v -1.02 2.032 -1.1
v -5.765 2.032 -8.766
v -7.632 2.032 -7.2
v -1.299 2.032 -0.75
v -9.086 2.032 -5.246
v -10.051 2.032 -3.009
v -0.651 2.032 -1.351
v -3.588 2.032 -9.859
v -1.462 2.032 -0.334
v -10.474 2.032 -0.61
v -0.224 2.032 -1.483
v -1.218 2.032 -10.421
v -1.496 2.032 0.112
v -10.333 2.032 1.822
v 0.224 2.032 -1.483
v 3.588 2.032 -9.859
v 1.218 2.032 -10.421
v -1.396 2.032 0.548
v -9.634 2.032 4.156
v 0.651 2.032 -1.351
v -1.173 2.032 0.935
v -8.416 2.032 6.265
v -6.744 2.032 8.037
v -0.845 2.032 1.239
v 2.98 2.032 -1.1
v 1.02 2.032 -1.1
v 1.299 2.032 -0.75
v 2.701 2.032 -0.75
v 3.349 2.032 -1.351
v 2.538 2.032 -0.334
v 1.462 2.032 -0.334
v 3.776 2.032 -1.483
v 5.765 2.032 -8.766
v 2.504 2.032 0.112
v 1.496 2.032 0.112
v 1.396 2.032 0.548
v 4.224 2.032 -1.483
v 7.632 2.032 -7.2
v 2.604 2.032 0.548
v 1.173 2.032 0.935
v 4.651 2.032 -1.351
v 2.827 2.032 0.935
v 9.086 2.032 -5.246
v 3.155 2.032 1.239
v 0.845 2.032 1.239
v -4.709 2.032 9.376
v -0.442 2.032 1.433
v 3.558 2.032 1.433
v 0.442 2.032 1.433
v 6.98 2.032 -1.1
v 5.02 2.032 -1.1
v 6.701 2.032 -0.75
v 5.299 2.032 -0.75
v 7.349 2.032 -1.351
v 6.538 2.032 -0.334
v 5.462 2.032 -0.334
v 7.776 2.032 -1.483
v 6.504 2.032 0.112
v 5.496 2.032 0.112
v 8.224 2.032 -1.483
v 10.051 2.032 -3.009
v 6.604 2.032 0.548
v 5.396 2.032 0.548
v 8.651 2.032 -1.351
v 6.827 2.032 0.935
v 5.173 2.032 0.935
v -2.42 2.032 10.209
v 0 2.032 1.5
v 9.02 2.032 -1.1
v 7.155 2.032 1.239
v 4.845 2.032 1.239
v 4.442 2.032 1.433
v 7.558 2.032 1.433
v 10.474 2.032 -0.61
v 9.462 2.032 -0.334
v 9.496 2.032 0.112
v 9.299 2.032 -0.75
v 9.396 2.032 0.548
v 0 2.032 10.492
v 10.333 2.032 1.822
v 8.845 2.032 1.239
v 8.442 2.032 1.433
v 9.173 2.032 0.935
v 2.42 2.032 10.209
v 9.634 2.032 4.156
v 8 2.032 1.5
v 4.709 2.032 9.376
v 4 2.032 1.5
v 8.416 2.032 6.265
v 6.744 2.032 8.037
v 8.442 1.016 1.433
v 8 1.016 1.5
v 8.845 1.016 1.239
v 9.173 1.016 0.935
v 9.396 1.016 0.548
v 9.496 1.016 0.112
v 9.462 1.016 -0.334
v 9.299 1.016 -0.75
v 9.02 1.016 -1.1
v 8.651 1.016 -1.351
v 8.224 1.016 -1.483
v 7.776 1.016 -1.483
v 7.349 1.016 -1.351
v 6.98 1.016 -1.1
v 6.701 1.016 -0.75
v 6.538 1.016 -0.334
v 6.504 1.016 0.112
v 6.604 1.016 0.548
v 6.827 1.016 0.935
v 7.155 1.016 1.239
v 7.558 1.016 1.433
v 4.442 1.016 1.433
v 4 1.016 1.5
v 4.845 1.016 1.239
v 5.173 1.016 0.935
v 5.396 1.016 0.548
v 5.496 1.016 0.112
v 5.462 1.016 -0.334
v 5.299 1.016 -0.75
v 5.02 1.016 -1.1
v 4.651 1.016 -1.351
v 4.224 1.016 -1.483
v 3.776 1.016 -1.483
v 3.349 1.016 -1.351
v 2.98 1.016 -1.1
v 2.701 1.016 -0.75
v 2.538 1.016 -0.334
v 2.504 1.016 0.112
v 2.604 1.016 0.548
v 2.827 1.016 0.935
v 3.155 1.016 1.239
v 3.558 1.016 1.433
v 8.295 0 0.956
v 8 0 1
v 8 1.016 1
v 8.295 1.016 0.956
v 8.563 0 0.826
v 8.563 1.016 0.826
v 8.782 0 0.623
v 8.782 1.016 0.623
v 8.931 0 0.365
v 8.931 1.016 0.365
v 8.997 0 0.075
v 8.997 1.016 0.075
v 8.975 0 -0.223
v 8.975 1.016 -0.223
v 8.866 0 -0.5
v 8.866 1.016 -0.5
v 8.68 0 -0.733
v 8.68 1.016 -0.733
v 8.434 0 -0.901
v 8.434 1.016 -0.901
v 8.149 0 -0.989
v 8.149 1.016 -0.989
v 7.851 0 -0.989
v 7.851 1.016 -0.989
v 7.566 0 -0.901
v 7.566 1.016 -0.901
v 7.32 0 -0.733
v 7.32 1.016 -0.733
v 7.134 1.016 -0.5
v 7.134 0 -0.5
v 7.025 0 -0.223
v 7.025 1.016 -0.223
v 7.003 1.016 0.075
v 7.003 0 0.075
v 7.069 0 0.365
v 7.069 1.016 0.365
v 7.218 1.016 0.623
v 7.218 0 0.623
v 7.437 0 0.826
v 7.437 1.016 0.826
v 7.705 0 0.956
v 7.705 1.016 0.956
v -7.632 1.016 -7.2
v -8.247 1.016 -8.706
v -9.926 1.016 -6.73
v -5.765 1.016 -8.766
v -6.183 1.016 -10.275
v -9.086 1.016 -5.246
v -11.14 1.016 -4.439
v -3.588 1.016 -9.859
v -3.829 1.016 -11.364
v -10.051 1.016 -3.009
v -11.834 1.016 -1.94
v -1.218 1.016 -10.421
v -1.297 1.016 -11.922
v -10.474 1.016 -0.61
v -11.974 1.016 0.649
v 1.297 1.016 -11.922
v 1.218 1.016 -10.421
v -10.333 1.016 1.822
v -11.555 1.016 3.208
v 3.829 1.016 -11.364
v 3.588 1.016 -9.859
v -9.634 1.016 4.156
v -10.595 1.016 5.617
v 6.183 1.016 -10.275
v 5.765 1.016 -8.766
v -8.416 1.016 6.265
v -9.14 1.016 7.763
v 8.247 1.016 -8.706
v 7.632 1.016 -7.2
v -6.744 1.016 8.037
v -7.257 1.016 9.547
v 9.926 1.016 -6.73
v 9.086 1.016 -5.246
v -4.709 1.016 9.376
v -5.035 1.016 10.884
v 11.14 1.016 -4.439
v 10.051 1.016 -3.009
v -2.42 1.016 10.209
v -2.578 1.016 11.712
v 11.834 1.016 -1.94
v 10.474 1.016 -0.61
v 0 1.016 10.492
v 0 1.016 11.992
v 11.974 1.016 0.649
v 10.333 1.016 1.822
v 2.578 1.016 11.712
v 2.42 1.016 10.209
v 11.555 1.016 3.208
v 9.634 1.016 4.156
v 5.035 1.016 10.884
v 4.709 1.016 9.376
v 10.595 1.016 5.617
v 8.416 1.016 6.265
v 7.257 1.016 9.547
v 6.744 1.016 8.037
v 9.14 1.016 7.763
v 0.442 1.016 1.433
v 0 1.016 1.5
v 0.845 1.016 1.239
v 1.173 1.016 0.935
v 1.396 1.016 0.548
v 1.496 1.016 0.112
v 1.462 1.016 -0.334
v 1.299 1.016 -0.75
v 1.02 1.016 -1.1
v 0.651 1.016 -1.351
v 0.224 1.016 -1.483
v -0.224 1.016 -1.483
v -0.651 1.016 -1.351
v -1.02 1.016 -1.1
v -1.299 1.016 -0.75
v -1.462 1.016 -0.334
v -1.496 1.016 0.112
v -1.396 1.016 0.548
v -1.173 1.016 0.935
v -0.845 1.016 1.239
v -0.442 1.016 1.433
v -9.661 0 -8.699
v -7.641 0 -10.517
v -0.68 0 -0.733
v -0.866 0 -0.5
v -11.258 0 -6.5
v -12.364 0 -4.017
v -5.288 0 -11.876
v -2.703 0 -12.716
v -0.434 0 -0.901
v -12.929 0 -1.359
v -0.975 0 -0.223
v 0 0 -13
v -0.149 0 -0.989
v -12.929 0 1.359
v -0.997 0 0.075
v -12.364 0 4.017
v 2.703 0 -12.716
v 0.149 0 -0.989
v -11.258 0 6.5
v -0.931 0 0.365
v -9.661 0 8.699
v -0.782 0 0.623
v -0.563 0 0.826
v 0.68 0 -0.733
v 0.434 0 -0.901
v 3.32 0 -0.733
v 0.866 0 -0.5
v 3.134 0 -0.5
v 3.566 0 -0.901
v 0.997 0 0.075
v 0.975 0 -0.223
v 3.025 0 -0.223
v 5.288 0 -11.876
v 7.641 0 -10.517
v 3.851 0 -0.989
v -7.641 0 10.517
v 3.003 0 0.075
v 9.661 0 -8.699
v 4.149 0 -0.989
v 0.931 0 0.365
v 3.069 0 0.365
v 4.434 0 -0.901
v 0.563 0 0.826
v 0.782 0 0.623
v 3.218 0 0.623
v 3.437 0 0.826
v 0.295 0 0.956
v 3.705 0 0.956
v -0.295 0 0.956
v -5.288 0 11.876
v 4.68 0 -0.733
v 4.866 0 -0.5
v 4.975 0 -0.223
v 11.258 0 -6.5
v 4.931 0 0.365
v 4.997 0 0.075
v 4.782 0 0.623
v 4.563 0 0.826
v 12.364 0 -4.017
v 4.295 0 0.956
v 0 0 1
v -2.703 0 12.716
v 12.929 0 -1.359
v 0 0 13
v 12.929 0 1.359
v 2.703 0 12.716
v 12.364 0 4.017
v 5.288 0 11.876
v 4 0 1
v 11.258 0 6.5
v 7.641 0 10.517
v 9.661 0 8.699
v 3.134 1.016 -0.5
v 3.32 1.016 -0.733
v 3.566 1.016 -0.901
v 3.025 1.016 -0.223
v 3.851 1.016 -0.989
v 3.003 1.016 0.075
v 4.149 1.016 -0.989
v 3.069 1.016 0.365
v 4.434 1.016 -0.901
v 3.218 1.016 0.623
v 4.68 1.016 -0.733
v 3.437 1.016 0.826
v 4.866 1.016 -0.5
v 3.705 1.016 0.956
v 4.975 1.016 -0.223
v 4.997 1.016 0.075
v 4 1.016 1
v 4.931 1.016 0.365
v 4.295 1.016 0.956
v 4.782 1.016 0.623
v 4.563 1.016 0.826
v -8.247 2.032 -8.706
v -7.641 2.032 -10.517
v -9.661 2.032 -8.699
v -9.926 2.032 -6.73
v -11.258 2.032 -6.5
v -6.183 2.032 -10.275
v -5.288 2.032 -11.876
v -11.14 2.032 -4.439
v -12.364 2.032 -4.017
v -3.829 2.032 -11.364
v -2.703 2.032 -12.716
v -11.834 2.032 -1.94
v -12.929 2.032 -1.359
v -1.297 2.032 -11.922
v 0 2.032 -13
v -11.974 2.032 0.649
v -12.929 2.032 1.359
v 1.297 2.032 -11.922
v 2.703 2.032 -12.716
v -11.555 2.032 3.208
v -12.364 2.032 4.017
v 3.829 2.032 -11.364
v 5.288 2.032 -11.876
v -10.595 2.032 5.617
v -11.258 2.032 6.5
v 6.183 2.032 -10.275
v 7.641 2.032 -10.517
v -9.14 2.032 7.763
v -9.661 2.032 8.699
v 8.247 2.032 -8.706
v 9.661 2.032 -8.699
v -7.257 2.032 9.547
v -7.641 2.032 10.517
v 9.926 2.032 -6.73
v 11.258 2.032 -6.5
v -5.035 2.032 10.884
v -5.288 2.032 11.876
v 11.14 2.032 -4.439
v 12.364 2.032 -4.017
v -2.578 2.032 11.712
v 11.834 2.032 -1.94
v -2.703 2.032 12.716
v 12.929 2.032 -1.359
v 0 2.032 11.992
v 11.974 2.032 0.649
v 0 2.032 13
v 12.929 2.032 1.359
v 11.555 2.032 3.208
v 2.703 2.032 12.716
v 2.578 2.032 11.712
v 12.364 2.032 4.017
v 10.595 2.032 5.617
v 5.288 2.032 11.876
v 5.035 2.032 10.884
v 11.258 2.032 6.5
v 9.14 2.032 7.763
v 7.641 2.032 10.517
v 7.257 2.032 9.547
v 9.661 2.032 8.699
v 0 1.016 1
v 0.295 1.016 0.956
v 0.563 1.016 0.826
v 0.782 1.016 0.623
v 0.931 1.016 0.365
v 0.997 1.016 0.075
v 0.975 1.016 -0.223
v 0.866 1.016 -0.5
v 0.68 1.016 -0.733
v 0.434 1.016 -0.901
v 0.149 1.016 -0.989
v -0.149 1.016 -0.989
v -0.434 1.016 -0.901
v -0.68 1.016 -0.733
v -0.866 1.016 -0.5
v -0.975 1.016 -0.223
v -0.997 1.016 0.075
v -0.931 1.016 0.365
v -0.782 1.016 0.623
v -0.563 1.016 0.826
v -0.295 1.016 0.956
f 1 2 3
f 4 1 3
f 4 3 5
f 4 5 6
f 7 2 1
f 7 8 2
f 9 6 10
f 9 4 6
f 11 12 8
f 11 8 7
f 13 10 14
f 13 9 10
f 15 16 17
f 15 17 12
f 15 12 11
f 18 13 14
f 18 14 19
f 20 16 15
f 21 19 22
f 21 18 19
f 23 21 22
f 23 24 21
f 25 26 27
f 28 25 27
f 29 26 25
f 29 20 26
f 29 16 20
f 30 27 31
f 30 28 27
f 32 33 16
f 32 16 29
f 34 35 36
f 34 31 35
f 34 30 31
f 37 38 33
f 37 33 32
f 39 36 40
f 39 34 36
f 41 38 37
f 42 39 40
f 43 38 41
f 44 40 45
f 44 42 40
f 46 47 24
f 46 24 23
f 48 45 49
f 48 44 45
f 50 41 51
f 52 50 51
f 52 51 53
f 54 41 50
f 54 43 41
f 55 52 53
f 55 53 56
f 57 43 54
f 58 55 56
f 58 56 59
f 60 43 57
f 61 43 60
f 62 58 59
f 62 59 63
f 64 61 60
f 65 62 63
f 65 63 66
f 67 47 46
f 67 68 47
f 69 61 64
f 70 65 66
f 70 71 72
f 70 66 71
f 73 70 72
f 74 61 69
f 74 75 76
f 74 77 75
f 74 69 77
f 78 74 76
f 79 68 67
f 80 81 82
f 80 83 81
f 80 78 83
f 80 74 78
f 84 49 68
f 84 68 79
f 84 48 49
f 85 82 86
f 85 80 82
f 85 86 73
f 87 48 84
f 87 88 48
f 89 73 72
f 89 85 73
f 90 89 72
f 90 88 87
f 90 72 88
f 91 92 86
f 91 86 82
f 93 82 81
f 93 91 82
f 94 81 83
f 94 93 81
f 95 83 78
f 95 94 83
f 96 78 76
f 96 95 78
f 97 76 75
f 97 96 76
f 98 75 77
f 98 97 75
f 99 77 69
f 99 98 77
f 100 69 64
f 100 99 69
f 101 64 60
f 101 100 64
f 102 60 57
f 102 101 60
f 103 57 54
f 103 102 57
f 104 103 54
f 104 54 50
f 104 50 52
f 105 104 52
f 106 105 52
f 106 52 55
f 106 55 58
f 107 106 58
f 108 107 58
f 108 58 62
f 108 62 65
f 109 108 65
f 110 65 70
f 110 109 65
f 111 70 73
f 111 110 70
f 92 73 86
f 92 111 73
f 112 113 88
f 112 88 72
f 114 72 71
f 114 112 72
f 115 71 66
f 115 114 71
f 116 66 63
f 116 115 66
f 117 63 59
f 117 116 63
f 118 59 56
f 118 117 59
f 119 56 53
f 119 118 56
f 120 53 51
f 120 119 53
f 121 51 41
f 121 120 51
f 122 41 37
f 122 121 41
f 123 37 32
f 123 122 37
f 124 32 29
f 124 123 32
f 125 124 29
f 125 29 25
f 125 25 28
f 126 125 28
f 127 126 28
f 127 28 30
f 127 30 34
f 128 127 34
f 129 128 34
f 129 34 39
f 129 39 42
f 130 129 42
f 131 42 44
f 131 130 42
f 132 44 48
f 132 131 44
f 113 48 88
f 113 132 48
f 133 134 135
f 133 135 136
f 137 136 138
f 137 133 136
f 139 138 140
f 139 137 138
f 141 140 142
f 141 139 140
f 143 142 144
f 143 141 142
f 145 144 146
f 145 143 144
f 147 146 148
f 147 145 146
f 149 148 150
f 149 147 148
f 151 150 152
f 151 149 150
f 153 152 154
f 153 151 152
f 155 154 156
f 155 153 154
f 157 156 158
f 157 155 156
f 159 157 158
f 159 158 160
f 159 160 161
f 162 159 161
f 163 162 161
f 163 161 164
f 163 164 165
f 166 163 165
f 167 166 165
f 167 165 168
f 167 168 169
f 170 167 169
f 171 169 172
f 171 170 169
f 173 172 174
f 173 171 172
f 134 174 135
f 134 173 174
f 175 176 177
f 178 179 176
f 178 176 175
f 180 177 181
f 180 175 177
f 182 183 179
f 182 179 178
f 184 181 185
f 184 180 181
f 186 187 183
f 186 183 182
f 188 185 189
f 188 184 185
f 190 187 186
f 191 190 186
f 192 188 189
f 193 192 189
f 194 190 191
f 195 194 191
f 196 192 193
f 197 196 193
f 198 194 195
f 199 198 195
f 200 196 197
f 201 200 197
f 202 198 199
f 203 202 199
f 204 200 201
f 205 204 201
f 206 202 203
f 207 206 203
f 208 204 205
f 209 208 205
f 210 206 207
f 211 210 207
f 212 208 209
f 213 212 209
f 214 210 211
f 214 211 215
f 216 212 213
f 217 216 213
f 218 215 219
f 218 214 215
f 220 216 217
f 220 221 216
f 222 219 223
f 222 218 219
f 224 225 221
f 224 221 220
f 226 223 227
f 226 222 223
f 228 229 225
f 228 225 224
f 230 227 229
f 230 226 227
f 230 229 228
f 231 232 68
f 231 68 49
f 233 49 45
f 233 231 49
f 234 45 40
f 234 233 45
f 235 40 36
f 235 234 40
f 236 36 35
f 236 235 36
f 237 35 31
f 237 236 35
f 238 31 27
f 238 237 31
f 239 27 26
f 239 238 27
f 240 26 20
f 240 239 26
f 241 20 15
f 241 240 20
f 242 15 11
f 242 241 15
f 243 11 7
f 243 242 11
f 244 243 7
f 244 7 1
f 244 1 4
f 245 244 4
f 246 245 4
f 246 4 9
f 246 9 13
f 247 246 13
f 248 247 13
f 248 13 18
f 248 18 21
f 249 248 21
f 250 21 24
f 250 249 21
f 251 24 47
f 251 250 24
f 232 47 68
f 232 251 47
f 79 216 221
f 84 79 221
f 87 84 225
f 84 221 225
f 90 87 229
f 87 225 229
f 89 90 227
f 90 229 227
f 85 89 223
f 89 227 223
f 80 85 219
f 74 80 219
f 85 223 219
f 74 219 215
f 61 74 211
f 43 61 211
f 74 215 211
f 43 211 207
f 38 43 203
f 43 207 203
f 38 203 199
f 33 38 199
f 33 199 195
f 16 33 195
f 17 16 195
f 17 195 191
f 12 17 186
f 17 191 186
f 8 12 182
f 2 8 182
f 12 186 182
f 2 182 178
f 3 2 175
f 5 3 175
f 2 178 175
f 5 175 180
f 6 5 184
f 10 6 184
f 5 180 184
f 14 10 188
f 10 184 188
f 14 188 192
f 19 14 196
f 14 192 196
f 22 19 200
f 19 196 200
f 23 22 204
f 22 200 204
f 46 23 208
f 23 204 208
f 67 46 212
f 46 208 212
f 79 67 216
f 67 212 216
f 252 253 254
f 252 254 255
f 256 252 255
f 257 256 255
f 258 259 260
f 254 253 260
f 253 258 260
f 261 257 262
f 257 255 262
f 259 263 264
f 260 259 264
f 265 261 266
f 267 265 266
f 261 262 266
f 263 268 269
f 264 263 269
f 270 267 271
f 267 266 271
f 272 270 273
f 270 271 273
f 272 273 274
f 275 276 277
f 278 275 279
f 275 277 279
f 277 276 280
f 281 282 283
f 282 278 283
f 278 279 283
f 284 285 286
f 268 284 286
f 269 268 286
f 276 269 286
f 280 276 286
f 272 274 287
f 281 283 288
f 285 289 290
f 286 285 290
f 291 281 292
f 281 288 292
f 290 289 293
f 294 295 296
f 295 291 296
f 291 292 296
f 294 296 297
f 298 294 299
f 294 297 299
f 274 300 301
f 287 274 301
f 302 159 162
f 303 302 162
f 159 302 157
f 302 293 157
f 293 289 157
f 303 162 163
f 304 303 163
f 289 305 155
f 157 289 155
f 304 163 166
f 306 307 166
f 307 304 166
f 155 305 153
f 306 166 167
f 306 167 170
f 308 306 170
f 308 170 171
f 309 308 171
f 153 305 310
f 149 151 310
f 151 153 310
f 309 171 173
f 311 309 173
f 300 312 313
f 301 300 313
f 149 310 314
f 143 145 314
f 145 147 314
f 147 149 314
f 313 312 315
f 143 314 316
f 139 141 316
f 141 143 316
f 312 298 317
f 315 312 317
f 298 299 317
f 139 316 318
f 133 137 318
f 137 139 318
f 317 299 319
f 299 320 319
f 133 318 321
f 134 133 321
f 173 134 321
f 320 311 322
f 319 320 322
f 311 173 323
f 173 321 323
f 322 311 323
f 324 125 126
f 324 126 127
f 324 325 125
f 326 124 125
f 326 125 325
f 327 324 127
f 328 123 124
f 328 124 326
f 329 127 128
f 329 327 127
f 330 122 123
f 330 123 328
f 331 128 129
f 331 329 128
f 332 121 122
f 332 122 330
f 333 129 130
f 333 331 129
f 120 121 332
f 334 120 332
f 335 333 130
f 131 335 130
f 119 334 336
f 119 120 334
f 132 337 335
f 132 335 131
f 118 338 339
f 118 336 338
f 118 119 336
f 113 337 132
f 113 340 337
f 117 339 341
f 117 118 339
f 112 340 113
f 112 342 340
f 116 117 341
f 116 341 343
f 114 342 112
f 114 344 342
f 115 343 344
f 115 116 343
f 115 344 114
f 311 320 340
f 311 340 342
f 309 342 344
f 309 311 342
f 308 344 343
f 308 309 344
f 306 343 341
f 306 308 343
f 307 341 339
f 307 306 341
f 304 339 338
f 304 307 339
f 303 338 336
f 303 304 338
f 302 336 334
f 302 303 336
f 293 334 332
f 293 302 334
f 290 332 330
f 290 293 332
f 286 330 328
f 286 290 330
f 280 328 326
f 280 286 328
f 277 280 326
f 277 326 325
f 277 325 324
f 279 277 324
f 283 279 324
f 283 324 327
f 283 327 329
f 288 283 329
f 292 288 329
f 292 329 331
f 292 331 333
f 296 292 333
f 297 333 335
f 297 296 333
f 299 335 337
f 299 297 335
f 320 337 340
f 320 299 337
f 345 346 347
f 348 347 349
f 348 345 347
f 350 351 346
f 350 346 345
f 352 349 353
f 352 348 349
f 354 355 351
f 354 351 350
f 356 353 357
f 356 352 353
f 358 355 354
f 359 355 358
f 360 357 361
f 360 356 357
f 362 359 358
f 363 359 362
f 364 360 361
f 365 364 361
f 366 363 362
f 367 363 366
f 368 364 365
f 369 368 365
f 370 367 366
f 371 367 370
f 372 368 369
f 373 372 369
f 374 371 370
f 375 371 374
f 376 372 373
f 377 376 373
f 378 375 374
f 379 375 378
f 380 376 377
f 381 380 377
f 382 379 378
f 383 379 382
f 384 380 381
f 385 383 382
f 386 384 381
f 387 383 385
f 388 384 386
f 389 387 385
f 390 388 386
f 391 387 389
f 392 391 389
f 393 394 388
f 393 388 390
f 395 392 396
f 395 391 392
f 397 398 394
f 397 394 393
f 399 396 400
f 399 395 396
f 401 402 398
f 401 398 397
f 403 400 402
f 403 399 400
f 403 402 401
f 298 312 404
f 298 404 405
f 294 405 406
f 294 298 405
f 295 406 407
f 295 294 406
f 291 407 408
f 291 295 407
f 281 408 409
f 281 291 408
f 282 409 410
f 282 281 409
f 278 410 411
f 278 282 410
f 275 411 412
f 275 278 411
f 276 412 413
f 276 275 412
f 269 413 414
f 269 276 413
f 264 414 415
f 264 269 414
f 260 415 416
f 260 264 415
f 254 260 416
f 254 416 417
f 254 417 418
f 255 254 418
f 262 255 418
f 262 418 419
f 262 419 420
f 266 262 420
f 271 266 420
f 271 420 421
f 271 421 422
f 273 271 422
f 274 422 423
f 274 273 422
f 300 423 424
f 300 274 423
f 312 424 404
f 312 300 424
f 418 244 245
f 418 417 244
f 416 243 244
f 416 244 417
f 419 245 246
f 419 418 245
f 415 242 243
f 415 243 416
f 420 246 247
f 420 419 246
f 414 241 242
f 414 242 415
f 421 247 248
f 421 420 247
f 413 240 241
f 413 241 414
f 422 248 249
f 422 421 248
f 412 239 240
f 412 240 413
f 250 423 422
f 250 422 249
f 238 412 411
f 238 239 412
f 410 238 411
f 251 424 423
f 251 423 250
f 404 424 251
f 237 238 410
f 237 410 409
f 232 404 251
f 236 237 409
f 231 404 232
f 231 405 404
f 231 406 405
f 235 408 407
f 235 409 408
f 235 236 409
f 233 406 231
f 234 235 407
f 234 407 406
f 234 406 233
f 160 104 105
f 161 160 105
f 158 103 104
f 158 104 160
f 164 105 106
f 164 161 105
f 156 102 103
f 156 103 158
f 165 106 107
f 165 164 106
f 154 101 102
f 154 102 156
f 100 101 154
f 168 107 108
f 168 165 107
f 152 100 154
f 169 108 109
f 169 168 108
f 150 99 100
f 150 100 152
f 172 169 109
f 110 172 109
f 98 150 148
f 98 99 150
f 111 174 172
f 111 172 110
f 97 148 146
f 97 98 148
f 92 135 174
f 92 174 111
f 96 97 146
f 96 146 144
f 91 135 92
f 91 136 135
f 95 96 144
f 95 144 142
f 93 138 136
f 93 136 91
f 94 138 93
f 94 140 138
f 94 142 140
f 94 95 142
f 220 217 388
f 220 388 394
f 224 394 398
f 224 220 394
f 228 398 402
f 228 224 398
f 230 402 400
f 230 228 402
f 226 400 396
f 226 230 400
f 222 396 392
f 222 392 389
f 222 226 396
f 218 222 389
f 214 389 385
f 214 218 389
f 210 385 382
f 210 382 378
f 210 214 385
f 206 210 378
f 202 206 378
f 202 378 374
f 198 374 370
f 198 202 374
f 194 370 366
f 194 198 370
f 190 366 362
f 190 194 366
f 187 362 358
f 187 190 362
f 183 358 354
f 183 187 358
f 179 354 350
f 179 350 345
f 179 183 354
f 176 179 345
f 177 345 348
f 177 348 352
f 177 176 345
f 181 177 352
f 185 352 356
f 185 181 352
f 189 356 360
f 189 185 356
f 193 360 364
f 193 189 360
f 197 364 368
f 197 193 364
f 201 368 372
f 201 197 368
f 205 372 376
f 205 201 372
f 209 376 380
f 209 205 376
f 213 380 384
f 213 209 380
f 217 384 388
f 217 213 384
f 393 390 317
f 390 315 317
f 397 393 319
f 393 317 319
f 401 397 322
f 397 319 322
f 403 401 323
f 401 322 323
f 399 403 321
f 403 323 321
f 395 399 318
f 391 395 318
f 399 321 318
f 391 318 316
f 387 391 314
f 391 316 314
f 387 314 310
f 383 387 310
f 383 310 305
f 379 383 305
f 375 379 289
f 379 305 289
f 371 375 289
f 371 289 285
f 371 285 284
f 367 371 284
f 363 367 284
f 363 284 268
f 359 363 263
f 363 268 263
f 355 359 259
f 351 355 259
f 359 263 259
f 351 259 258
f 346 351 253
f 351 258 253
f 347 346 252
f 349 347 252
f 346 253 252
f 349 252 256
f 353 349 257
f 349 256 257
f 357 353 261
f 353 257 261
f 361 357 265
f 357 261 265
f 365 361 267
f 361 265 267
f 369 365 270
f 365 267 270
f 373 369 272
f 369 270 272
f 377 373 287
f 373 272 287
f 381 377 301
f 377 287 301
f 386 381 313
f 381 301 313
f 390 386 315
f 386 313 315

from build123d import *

# Parameters (mm, degrees)
SKETCH2_R           = 13
SKETCH2_R_2         = 1
BOSS_EXTRUDE2_DEPTH = 1.016
SKETCH3_R           = 13
SKETCH3_R_2         = 11.992
SKETCH3_R_3         = 10.492
SKETCH3_R_4         = 1.5
BOSS_EXTRUDE4_DEPTH = 1.016


with BuildPart() as part:
    # Sketch2 → Boss-Extrude2 (new body)
    with BuildSketch(Plane(origin=(0, 0, 0), x_dir=(1, 0, 0), z_dir=(0, 1, 0))):
        with Locations(Location((0, 0, 0), (0, 0, 270))):
            Circle(SKETCH2_R)
        with Locations(Location((0, 0, 0), (0, 0, 270))):
            Circle(SKETCH2_R_2, mode=Mode.SUBTRACT)
        with Locations(Location((4, 0, 0), (0, 0, 270))):
            Circle(SKETCH2_R_2, mode=Mode.SUBTRACT)
        with Locations(Location((8, 0, 0), (0, 0, 270))):
            Circle(SKETCH2_R_2, mode=Mode.SUBTRACT)
    extrude(amount=BOSS_EXTRUDE2_DEPTH)

    # Sketch3 → Boss-Extrude4 (add)
    # profile 1 of 2: a face of its own
    with BuildSketch(Plane(origin=(0, 1.016, 0), x_dir=(1, 0, 0), z_dir=(0, 1, 0))):
        with Locations(Location((0, 0, 0), (0, 0, 270))):
            Circle(SKETCH3_R)
        with Locations(Location((0, 0, 0), (0, 0, 270))):
            Circle(SKETCH3_R_2, mode=Mode.SUBTRACT)
    # profile 2 of 2: a face of its own
    with BuildSketch(Plane(origin=(0, 1.016, 0), x_dir=(1, 0, 0), z_dir=(0, 1, 0))):
        with Locations(Location((0, 0, 0), (0, 0, 270))):
            Circle(SKETCH3_R_3)
        with Locations(Location((0, 0, 0), (0, 0, 270))):
            Circle(SKETCH3_R_4, mode=Mode.SUBTRACT)
        with Locations(Location((4, 0, 0), (0, 0, 270))):
            Circle(SKETCH3_R_4, mode=Mode.SUBTRACT)
        with Locations(Location((8, 0, 0), (0, 0, 270))):
            Circle(SKETCH3_R_4, mode=Mode.SUBTRACT)
    extrude(amount=BOSS_EXTRUDE4_DEPTH)


solid = part.part
